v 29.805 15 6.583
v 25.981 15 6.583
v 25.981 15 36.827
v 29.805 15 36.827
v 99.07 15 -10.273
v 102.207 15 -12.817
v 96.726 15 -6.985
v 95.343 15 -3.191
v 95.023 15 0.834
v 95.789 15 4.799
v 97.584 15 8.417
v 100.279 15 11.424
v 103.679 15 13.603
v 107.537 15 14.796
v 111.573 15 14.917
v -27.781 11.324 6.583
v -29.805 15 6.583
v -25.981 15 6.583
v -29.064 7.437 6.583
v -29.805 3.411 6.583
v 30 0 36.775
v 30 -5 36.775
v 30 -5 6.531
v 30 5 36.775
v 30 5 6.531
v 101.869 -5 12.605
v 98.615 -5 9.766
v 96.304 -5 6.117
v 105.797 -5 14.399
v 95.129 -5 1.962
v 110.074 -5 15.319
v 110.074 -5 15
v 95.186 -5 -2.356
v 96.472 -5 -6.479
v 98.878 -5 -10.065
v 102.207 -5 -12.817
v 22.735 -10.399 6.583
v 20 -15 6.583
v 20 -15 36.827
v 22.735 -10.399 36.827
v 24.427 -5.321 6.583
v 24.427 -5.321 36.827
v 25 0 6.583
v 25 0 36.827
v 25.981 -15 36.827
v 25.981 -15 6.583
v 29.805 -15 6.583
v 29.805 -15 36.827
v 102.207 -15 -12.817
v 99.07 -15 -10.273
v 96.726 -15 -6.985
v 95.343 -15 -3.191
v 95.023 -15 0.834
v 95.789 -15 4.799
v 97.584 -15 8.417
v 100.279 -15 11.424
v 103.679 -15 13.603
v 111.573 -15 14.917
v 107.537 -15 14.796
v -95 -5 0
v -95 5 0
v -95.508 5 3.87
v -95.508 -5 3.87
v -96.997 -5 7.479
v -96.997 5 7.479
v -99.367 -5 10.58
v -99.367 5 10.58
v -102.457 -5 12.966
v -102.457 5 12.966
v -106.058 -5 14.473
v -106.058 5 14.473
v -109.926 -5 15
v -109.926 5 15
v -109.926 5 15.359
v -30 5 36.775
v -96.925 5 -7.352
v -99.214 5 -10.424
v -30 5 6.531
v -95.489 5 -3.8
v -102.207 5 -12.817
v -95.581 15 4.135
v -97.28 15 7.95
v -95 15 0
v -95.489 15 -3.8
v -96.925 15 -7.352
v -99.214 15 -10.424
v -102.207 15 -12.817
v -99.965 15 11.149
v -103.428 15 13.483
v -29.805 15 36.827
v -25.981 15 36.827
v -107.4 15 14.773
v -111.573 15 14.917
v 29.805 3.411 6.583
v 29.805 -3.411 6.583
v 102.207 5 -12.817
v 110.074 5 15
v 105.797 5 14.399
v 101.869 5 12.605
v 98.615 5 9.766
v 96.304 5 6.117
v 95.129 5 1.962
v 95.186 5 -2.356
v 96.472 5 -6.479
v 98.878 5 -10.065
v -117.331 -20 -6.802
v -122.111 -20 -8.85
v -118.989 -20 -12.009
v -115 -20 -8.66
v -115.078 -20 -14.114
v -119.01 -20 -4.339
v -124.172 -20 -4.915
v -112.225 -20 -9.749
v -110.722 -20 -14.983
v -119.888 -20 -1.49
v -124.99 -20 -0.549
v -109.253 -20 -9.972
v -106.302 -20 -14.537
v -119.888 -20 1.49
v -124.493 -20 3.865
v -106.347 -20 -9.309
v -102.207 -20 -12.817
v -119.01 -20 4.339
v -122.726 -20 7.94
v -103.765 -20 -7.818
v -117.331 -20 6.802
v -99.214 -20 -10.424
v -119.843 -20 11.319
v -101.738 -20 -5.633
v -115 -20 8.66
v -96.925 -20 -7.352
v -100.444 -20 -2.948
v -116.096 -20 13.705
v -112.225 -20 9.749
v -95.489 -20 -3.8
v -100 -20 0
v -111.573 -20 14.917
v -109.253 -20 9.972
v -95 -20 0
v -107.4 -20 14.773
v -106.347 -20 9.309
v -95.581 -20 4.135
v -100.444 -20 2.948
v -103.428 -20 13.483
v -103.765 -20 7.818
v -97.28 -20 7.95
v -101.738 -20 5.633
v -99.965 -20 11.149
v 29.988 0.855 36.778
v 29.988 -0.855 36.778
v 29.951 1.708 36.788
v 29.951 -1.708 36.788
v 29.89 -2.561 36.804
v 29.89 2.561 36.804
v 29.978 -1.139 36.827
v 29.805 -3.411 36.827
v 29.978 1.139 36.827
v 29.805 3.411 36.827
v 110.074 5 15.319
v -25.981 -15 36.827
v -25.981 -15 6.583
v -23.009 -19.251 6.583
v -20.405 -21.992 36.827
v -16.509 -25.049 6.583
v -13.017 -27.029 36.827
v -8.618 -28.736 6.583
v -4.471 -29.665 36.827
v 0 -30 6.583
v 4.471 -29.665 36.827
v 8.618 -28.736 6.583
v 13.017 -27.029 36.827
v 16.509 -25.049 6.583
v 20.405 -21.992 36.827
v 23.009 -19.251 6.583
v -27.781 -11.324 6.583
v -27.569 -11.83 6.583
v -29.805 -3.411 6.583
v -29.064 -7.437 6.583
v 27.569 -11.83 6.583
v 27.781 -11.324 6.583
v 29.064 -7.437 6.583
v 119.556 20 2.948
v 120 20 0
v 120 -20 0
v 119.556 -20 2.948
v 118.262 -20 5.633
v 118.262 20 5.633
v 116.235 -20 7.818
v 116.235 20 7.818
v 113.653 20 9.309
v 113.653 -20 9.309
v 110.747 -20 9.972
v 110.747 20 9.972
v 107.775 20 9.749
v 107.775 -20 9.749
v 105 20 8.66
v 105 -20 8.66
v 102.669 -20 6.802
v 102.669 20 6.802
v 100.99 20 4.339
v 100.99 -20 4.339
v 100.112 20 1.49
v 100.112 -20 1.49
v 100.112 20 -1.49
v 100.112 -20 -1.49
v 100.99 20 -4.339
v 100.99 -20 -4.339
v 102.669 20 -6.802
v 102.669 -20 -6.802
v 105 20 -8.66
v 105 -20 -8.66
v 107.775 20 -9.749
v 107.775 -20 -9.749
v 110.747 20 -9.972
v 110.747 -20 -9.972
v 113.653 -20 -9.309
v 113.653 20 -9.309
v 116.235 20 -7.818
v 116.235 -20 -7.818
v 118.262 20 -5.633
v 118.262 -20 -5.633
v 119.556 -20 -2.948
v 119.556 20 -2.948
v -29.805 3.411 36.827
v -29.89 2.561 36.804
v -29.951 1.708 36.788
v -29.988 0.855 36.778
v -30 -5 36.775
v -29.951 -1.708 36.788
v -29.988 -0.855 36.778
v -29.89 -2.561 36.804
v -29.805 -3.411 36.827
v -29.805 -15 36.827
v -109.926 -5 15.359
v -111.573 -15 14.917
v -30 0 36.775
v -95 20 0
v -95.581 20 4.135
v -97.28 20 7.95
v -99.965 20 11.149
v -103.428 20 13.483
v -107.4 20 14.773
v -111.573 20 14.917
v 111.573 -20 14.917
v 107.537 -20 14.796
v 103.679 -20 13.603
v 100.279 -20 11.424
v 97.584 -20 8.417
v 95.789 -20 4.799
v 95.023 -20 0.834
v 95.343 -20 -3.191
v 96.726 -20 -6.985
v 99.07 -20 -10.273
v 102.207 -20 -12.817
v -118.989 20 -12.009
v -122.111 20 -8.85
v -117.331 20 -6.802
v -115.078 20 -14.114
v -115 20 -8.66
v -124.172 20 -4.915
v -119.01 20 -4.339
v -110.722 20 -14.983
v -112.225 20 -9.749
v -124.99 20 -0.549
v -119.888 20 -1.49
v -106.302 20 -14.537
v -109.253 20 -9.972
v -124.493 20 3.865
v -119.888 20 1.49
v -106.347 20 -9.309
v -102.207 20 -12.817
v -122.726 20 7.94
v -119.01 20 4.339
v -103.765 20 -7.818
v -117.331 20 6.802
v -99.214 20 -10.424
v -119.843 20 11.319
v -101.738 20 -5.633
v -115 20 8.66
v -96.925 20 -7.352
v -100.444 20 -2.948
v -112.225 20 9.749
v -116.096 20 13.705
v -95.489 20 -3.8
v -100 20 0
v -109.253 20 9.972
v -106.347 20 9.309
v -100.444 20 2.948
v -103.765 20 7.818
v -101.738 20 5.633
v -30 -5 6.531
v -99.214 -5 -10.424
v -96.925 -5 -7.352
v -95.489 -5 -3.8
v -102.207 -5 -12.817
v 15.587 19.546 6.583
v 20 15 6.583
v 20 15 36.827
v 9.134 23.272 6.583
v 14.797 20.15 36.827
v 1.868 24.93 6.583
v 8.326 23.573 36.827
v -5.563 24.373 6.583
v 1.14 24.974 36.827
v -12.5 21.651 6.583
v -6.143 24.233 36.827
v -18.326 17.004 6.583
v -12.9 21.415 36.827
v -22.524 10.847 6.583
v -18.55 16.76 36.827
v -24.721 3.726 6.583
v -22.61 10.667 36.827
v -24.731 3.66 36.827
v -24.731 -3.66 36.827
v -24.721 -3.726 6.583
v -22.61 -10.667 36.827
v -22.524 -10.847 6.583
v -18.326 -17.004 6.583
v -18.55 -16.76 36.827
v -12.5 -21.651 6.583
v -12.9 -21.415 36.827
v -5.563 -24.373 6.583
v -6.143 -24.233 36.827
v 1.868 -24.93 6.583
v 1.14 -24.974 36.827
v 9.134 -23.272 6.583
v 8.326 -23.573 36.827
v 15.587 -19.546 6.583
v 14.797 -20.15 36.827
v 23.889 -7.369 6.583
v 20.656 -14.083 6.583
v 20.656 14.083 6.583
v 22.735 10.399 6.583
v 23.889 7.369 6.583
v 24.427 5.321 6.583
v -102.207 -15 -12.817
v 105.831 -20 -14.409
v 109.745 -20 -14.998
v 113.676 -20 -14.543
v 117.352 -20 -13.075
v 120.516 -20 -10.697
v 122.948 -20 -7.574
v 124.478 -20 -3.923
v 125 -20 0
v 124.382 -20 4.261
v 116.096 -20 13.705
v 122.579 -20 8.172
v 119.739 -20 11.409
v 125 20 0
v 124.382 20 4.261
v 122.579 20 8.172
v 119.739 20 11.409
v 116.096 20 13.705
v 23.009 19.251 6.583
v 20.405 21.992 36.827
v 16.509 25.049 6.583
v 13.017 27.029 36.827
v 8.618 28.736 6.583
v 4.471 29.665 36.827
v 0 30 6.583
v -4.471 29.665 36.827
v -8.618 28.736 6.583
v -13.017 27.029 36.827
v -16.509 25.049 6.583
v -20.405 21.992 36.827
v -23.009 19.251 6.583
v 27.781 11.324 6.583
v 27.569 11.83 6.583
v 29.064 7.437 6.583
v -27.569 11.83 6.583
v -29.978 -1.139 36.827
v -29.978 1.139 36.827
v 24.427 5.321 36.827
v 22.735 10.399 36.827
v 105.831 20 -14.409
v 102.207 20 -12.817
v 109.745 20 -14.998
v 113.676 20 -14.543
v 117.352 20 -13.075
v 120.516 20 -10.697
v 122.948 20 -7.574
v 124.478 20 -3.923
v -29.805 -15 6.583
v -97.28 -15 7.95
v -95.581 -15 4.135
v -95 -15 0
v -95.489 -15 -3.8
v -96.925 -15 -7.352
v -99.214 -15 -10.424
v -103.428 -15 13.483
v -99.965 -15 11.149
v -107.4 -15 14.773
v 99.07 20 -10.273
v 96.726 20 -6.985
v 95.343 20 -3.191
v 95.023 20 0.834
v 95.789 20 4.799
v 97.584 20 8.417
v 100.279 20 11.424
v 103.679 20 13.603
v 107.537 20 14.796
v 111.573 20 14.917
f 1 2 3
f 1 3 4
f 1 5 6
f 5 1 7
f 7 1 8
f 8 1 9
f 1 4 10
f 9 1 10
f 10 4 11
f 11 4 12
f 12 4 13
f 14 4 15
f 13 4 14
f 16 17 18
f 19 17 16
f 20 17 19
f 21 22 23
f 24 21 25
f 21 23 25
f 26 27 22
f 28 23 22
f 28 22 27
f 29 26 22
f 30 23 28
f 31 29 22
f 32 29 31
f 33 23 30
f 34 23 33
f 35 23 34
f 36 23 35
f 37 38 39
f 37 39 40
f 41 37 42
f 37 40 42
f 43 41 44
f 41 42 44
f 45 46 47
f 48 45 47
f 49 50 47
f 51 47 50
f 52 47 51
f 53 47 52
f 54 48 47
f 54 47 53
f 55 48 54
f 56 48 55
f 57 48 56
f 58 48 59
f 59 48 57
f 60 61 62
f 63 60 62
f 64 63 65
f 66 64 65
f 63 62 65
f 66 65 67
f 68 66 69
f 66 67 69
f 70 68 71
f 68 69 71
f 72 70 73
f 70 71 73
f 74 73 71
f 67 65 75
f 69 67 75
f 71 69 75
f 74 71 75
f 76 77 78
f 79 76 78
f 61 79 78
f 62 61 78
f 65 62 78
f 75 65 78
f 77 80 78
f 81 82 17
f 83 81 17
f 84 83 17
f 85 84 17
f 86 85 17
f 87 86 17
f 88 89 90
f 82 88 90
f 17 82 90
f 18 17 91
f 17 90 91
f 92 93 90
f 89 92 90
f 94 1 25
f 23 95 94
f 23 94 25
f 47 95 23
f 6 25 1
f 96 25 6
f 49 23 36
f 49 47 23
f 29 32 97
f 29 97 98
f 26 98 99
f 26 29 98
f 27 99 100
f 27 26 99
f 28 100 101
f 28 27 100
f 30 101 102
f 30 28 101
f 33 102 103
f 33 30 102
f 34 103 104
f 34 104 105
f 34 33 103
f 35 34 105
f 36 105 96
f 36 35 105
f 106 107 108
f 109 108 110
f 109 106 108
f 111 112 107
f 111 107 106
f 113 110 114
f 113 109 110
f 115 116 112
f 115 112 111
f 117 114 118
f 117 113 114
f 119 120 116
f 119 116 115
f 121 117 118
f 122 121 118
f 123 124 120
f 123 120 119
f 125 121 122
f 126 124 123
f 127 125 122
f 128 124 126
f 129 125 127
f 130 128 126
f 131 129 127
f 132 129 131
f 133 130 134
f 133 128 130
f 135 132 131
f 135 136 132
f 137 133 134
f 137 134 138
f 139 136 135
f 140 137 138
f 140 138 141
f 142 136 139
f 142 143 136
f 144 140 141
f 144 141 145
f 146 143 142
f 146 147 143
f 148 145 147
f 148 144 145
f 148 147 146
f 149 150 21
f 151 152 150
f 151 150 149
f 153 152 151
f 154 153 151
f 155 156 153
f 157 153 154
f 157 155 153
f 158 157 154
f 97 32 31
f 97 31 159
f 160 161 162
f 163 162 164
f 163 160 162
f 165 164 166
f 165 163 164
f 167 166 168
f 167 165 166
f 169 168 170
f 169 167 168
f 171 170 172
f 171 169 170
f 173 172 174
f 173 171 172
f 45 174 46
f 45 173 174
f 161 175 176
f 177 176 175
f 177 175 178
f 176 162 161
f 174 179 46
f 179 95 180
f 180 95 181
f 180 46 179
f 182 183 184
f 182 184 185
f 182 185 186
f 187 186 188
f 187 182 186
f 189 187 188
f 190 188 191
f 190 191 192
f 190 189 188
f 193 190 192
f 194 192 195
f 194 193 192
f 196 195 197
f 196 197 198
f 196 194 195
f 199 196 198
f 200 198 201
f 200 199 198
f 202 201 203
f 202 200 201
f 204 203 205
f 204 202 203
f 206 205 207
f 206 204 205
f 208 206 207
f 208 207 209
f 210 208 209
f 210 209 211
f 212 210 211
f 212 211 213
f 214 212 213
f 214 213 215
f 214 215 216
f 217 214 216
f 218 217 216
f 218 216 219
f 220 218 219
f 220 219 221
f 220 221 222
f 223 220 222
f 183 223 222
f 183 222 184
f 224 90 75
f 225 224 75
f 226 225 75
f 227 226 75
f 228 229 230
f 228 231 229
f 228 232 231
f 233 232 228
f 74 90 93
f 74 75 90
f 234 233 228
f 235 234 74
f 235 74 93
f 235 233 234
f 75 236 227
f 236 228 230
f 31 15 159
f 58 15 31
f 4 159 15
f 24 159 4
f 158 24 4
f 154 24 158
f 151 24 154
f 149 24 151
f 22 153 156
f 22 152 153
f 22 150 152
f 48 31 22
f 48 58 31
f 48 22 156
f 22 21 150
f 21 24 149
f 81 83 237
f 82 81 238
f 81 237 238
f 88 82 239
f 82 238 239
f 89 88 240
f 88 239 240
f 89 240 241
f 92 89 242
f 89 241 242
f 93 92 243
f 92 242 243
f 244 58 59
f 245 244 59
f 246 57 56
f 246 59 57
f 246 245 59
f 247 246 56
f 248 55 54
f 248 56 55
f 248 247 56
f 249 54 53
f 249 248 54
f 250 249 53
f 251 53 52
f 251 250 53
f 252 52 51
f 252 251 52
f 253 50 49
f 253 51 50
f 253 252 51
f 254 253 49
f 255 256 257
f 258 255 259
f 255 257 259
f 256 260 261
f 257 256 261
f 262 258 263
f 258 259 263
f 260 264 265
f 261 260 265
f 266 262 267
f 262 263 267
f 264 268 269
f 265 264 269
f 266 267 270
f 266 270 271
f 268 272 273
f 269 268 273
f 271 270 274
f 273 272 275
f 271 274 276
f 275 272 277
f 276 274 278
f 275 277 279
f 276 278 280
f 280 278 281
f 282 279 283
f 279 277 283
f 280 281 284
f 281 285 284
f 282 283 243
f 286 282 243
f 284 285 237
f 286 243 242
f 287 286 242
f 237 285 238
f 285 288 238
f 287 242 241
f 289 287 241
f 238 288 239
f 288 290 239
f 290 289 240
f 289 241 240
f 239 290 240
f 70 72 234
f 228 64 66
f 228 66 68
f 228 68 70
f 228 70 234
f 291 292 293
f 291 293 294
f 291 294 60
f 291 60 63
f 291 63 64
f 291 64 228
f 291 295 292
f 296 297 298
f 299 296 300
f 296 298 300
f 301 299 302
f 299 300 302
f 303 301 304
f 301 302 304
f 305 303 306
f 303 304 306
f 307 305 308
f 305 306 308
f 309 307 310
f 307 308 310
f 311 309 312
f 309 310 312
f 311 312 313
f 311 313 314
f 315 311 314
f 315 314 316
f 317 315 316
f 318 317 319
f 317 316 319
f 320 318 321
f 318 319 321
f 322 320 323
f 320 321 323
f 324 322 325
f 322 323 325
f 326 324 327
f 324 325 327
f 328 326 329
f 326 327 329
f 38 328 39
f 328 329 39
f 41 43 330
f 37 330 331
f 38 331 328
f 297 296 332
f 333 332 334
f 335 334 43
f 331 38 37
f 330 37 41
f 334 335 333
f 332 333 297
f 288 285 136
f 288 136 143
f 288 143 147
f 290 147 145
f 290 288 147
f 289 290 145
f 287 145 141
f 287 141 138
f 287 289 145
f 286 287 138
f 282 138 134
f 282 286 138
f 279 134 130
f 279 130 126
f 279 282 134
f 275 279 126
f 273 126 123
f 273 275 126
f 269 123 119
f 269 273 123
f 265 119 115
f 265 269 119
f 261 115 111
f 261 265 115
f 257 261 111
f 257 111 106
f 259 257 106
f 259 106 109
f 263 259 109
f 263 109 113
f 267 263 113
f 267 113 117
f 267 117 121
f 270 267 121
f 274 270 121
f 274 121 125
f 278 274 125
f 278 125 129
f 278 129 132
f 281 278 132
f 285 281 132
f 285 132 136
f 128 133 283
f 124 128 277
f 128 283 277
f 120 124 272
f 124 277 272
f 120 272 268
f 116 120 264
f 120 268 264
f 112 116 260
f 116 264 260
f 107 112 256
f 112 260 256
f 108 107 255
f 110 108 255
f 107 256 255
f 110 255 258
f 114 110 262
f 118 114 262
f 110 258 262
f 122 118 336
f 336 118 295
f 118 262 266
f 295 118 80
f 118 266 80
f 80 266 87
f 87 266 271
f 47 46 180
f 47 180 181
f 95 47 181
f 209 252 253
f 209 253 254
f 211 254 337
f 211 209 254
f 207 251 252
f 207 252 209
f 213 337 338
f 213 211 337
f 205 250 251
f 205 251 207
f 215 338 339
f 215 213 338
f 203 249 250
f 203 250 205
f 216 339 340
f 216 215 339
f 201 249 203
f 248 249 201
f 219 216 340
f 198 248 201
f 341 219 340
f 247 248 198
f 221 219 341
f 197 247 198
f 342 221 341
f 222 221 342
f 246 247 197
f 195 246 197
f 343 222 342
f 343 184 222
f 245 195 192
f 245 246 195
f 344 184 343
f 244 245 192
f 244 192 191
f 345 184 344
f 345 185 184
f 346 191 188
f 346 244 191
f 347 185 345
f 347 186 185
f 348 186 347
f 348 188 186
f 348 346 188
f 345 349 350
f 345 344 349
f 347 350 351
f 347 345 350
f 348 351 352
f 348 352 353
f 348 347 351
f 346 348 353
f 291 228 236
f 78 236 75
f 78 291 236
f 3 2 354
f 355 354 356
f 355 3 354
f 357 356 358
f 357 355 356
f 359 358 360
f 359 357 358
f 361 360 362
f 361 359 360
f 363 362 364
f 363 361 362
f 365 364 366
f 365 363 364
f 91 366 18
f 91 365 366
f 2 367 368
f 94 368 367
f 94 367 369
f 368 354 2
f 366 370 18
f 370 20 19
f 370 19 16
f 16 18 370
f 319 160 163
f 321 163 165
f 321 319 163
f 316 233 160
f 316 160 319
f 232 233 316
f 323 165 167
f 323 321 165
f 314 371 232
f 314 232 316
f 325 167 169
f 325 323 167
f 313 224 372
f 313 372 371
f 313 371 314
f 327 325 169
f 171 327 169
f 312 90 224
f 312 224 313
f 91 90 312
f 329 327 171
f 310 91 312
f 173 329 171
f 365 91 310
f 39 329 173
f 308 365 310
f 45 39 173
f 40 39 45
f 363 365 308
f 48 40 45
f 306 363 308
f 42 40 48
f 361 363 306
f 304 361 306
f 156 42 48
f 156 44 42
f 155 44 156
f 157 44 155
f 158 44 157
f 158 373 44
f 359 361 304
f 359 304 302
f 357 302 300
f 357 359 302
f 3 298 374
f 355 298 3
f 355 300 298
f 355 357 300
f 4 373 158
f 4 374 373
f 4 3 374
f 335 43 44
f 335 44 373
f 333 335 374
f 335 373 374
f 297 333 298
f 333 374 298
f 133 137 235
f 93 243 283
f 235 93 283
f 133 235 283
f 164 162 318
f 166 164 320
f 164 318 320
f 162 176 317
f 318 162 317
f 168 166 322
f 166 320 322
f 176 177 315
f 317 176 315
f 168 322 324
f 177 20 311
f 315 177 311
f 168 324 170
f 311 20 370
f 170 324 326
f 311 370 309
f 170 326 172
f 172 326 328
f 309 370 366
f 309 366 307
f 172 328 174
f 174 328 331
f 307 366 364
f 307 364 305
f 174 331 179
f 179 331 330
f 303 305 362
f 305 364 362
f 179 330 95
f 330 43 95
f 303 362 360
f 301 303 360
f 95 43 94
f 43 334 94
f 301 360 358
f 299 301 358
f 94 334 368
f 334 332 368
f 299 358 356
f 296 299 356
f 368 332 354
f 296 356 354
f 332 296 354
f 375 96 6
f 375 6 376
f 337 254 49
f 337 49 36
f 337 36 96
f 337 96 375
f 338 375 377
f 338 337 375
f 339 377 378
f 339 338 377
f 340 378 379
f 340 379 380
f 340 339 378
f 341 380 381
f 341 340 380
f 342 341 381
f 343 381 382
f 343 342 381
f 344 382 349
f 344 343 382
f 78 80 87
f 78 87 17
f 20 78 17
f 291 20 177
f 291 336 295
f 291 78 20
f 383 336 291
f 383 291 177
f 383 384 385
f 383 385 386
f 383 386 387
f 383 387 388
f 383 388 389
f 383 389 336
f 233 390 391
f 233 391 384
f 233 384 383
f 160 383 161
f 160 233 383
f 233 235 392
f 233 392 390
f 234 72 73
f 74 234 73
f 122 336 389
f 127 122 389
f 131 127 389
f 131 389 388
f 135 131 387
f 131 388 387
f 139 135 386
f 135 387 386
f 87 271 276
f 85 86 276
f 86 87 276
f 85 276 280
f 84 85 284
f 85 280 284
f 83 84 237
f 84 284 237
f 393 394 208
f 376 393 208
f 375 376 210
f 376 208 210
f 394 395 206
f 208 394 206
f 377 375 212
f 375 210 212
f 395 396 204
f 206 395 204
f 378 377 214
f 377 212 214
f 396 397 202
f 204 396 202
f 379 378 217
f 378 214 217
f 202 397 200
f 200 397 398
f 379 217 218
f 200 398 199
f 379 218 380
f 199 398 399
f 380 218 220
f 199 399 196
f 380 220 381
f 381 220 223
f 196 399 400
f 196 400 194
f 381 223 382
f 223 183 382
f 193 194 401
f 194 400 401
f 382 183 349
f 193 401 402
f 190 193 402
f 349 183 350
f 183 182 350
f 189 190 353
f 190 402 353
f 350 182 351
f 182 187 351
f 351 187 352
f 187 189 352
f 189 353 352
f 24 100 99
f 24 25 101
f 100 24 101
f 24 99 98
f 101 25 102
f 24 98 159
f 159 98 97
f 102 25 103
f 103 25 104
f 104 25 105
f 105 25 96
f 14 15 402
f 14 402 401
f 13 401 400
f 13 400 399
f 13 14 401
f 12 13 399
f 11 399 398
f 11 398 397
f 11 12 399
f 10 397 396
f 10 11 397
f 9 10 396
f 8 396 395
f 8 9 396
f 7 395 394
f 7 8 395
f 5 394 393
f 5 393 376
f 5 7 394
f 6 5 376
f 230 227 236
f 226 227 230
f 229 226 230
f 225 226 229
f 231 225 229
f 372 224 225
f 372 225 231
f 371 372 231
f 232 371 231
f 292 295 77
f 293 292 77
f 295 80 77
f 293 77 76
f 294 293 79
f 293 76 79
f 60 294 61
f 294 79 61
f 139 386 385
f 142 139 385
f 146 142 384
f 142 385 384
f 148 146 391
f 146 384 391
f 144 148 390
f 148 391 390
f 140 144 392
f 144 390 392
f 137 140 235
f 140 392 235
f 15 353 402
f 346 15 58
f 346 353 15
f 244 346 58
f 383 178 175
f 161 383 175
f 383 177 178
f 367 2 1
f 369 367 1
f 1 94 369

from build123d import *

# Parameters (mm, degrees)
F1_DEPTH = 15
F0_R     = 10
F2_DEPTH = 20
F3_R     = 30
F3_R_2   = 25
F4_DEPTH = 30.243643
F5_DEPTH = 51.82786
F7_W     = 79.926214
F7_H     = 10
F7_W_2   = 80.073786
F8_DEPTH = 61.82786
F9_DEPTH = 5


with BuildPart() as f1:
    # F0 (on Front) → F1 (new body, symmetric)
    with BuildSketch(Plane.XZ):
        with BuildLine():
            ThreePointArc((-95, 0), (-96.92529, -7.352004), (-102.206927, -12.816709))
            Line((-102.206927, -12.816709), (-29.805417, 6.583218))
            Line((-29.805417, 6.583218), (-29.805417, 36.82686))
            Line((-29.805417, 36.82686), (-111.573049, 14.917289))
            ThreePointArc((-111.573049, 14.917289), (-99.964955, 11.148895), (-95, 0))
        make_face()
        Polygon((-29.805417, 36.82686), (-29.805417, 6.583218), (0, 6.583218), (29.805417, 6.583218), (29.805417, 36.82686), (0, 36.82686), align=None)
        with BuildLine():
            Line((29.805417, 36.82686), (29.805417, 6.583218))
            Line((29.805417, 6.583218), (102.206927, -12.816709))
            ThreePointArc((102.206927, -12.816709), (95.788532, 4.799393), (111.573049, 14.917289))
            Line((111.573049, 14.917289), (29.805417, 36.82686))
        make_face()
    extrude(amount=F1_DEPTH, both=True)

    # F0 (on Front) → F2 (join, symmetric)
    with BuildSketch(Plane.XZ):
        with BuildLine():
            Line((-111.573049, 14.917289), (-116.096344, 13.705276))
            ThreePointArc((-116.096344, 13.705276), (-123.288101, -6.958905), (-102.206927, -12.816709))
            ThreePointArc((-102.206927, -12.816709), (-96.92529, -7.352004), (-95, 0))
            ThreePointArc((-95, 0), (-99.964955, 11.148895), (-111.573049, 14.917289))
        make_face()
        with Locations((-110, 0)):
            Circle(F0_R, mode=Mode.SUBTRACT)
        with BuildLine():
            ThreePointArc((111.573049, 14.917289), (95.788532, 4.799393), (102.206927, -12.816709))
            ThreePointArc((102.206927, -12.816709), (117.352004, -13.07471), (125, 0))
            ThreePointArc((125, 0), (122.578656, 8.171745), (116.096344, 13.705276))
            Line((116.096344, 13.705276), (111.573049, 14.917289))
        make_face()
        with Locations((110, 0)):
            Circle(F0_R, mode=Mode.SUBTRACT)
    extrude(amount=F2_DEPTH, both=True)

    # F3 (on face) → F4 (join, through all)
    with BuildSketch(Plane.XY.offset(36.82686)):
        Circle(F3_R)
        Circle(F3_R_2, mode=Mode.SUBTRACT)
    extrude(amount=-F4_DEPTH)

    # F3 (on face) → F5 (cut, through all)
    with BuildSketch(Plane.XY.offset(36.82686)):
        with BuildLine():
            ThreePointArc((25, 0), (23.717082, 7.905694), (20, 15))
            Line((20, 15), (-20, 15))
            ThreePointArc((-20, 15), (-25, 0), (-20, -15))
            Line((-20, -15), (20, -15))
            ThreePointArc((20, -15), (23.717082, -7.905694), (25, 0))
        make_face()
    extrude(amount=-F5_DEPTH, mode=Mode.SUBTRACT)

    # F7 (on offset) → F8 (cut, through all)
    with BuildSketch(Plane.XY.offset(-25)):
        with Locations((-69.963107, 0)):
            Rectangle(F7_W, F7_H)
        with Locations((70.036893, 0)):
            Rectangle(F7_W_2, F7_H)
    extrude(amount=F8_DEPTH, mode=Mode.SUBTRACT)

    # F0 (on Front) → F9 (join, symmetric)
    with BuildSketch(Plane.XZ):
        with BuildLine():
            Line((-111.573049, 14.917289), (-116.096344, 13.705276))
            ThreePointArc((-116.096344, 13.705276), (-123.288101, -6.958905), (-102.206927, -12.816709))
            ThreePointArc((-102.206927, -12.816709), (-96.92529, -7.352004), (-95, 0))
            ThreePointArc((-95, 0), (-99.964955, 11.148895), (-111.573049, 14.917289))
        make_face()
        with Locations((-110, 0)):
            Circle(F0_R, mode=Mode.SUBTRACT)
        with BuildLine():
            ThreePointArc((111.573049, 14.917289), (95.788532, 4.799393), (102.206927, -12.816709))
            ThreePointArc((102.206927, -12.816709), (117.352004, -13.07471), (125, 0))
            ThreePointArc((125, 0), (122.578656, 8.171745), (116.096344, 13.705276))
            Line((116.096344, 13.705276), (111.573049, 14.917289))
        make_face()
        with Locations((110, 0)):
            Circle(F0_R, mode=Mode.SUBTRACT)
    extrude(amount=F9_DEPTH, both=True)


solid = f1.part
